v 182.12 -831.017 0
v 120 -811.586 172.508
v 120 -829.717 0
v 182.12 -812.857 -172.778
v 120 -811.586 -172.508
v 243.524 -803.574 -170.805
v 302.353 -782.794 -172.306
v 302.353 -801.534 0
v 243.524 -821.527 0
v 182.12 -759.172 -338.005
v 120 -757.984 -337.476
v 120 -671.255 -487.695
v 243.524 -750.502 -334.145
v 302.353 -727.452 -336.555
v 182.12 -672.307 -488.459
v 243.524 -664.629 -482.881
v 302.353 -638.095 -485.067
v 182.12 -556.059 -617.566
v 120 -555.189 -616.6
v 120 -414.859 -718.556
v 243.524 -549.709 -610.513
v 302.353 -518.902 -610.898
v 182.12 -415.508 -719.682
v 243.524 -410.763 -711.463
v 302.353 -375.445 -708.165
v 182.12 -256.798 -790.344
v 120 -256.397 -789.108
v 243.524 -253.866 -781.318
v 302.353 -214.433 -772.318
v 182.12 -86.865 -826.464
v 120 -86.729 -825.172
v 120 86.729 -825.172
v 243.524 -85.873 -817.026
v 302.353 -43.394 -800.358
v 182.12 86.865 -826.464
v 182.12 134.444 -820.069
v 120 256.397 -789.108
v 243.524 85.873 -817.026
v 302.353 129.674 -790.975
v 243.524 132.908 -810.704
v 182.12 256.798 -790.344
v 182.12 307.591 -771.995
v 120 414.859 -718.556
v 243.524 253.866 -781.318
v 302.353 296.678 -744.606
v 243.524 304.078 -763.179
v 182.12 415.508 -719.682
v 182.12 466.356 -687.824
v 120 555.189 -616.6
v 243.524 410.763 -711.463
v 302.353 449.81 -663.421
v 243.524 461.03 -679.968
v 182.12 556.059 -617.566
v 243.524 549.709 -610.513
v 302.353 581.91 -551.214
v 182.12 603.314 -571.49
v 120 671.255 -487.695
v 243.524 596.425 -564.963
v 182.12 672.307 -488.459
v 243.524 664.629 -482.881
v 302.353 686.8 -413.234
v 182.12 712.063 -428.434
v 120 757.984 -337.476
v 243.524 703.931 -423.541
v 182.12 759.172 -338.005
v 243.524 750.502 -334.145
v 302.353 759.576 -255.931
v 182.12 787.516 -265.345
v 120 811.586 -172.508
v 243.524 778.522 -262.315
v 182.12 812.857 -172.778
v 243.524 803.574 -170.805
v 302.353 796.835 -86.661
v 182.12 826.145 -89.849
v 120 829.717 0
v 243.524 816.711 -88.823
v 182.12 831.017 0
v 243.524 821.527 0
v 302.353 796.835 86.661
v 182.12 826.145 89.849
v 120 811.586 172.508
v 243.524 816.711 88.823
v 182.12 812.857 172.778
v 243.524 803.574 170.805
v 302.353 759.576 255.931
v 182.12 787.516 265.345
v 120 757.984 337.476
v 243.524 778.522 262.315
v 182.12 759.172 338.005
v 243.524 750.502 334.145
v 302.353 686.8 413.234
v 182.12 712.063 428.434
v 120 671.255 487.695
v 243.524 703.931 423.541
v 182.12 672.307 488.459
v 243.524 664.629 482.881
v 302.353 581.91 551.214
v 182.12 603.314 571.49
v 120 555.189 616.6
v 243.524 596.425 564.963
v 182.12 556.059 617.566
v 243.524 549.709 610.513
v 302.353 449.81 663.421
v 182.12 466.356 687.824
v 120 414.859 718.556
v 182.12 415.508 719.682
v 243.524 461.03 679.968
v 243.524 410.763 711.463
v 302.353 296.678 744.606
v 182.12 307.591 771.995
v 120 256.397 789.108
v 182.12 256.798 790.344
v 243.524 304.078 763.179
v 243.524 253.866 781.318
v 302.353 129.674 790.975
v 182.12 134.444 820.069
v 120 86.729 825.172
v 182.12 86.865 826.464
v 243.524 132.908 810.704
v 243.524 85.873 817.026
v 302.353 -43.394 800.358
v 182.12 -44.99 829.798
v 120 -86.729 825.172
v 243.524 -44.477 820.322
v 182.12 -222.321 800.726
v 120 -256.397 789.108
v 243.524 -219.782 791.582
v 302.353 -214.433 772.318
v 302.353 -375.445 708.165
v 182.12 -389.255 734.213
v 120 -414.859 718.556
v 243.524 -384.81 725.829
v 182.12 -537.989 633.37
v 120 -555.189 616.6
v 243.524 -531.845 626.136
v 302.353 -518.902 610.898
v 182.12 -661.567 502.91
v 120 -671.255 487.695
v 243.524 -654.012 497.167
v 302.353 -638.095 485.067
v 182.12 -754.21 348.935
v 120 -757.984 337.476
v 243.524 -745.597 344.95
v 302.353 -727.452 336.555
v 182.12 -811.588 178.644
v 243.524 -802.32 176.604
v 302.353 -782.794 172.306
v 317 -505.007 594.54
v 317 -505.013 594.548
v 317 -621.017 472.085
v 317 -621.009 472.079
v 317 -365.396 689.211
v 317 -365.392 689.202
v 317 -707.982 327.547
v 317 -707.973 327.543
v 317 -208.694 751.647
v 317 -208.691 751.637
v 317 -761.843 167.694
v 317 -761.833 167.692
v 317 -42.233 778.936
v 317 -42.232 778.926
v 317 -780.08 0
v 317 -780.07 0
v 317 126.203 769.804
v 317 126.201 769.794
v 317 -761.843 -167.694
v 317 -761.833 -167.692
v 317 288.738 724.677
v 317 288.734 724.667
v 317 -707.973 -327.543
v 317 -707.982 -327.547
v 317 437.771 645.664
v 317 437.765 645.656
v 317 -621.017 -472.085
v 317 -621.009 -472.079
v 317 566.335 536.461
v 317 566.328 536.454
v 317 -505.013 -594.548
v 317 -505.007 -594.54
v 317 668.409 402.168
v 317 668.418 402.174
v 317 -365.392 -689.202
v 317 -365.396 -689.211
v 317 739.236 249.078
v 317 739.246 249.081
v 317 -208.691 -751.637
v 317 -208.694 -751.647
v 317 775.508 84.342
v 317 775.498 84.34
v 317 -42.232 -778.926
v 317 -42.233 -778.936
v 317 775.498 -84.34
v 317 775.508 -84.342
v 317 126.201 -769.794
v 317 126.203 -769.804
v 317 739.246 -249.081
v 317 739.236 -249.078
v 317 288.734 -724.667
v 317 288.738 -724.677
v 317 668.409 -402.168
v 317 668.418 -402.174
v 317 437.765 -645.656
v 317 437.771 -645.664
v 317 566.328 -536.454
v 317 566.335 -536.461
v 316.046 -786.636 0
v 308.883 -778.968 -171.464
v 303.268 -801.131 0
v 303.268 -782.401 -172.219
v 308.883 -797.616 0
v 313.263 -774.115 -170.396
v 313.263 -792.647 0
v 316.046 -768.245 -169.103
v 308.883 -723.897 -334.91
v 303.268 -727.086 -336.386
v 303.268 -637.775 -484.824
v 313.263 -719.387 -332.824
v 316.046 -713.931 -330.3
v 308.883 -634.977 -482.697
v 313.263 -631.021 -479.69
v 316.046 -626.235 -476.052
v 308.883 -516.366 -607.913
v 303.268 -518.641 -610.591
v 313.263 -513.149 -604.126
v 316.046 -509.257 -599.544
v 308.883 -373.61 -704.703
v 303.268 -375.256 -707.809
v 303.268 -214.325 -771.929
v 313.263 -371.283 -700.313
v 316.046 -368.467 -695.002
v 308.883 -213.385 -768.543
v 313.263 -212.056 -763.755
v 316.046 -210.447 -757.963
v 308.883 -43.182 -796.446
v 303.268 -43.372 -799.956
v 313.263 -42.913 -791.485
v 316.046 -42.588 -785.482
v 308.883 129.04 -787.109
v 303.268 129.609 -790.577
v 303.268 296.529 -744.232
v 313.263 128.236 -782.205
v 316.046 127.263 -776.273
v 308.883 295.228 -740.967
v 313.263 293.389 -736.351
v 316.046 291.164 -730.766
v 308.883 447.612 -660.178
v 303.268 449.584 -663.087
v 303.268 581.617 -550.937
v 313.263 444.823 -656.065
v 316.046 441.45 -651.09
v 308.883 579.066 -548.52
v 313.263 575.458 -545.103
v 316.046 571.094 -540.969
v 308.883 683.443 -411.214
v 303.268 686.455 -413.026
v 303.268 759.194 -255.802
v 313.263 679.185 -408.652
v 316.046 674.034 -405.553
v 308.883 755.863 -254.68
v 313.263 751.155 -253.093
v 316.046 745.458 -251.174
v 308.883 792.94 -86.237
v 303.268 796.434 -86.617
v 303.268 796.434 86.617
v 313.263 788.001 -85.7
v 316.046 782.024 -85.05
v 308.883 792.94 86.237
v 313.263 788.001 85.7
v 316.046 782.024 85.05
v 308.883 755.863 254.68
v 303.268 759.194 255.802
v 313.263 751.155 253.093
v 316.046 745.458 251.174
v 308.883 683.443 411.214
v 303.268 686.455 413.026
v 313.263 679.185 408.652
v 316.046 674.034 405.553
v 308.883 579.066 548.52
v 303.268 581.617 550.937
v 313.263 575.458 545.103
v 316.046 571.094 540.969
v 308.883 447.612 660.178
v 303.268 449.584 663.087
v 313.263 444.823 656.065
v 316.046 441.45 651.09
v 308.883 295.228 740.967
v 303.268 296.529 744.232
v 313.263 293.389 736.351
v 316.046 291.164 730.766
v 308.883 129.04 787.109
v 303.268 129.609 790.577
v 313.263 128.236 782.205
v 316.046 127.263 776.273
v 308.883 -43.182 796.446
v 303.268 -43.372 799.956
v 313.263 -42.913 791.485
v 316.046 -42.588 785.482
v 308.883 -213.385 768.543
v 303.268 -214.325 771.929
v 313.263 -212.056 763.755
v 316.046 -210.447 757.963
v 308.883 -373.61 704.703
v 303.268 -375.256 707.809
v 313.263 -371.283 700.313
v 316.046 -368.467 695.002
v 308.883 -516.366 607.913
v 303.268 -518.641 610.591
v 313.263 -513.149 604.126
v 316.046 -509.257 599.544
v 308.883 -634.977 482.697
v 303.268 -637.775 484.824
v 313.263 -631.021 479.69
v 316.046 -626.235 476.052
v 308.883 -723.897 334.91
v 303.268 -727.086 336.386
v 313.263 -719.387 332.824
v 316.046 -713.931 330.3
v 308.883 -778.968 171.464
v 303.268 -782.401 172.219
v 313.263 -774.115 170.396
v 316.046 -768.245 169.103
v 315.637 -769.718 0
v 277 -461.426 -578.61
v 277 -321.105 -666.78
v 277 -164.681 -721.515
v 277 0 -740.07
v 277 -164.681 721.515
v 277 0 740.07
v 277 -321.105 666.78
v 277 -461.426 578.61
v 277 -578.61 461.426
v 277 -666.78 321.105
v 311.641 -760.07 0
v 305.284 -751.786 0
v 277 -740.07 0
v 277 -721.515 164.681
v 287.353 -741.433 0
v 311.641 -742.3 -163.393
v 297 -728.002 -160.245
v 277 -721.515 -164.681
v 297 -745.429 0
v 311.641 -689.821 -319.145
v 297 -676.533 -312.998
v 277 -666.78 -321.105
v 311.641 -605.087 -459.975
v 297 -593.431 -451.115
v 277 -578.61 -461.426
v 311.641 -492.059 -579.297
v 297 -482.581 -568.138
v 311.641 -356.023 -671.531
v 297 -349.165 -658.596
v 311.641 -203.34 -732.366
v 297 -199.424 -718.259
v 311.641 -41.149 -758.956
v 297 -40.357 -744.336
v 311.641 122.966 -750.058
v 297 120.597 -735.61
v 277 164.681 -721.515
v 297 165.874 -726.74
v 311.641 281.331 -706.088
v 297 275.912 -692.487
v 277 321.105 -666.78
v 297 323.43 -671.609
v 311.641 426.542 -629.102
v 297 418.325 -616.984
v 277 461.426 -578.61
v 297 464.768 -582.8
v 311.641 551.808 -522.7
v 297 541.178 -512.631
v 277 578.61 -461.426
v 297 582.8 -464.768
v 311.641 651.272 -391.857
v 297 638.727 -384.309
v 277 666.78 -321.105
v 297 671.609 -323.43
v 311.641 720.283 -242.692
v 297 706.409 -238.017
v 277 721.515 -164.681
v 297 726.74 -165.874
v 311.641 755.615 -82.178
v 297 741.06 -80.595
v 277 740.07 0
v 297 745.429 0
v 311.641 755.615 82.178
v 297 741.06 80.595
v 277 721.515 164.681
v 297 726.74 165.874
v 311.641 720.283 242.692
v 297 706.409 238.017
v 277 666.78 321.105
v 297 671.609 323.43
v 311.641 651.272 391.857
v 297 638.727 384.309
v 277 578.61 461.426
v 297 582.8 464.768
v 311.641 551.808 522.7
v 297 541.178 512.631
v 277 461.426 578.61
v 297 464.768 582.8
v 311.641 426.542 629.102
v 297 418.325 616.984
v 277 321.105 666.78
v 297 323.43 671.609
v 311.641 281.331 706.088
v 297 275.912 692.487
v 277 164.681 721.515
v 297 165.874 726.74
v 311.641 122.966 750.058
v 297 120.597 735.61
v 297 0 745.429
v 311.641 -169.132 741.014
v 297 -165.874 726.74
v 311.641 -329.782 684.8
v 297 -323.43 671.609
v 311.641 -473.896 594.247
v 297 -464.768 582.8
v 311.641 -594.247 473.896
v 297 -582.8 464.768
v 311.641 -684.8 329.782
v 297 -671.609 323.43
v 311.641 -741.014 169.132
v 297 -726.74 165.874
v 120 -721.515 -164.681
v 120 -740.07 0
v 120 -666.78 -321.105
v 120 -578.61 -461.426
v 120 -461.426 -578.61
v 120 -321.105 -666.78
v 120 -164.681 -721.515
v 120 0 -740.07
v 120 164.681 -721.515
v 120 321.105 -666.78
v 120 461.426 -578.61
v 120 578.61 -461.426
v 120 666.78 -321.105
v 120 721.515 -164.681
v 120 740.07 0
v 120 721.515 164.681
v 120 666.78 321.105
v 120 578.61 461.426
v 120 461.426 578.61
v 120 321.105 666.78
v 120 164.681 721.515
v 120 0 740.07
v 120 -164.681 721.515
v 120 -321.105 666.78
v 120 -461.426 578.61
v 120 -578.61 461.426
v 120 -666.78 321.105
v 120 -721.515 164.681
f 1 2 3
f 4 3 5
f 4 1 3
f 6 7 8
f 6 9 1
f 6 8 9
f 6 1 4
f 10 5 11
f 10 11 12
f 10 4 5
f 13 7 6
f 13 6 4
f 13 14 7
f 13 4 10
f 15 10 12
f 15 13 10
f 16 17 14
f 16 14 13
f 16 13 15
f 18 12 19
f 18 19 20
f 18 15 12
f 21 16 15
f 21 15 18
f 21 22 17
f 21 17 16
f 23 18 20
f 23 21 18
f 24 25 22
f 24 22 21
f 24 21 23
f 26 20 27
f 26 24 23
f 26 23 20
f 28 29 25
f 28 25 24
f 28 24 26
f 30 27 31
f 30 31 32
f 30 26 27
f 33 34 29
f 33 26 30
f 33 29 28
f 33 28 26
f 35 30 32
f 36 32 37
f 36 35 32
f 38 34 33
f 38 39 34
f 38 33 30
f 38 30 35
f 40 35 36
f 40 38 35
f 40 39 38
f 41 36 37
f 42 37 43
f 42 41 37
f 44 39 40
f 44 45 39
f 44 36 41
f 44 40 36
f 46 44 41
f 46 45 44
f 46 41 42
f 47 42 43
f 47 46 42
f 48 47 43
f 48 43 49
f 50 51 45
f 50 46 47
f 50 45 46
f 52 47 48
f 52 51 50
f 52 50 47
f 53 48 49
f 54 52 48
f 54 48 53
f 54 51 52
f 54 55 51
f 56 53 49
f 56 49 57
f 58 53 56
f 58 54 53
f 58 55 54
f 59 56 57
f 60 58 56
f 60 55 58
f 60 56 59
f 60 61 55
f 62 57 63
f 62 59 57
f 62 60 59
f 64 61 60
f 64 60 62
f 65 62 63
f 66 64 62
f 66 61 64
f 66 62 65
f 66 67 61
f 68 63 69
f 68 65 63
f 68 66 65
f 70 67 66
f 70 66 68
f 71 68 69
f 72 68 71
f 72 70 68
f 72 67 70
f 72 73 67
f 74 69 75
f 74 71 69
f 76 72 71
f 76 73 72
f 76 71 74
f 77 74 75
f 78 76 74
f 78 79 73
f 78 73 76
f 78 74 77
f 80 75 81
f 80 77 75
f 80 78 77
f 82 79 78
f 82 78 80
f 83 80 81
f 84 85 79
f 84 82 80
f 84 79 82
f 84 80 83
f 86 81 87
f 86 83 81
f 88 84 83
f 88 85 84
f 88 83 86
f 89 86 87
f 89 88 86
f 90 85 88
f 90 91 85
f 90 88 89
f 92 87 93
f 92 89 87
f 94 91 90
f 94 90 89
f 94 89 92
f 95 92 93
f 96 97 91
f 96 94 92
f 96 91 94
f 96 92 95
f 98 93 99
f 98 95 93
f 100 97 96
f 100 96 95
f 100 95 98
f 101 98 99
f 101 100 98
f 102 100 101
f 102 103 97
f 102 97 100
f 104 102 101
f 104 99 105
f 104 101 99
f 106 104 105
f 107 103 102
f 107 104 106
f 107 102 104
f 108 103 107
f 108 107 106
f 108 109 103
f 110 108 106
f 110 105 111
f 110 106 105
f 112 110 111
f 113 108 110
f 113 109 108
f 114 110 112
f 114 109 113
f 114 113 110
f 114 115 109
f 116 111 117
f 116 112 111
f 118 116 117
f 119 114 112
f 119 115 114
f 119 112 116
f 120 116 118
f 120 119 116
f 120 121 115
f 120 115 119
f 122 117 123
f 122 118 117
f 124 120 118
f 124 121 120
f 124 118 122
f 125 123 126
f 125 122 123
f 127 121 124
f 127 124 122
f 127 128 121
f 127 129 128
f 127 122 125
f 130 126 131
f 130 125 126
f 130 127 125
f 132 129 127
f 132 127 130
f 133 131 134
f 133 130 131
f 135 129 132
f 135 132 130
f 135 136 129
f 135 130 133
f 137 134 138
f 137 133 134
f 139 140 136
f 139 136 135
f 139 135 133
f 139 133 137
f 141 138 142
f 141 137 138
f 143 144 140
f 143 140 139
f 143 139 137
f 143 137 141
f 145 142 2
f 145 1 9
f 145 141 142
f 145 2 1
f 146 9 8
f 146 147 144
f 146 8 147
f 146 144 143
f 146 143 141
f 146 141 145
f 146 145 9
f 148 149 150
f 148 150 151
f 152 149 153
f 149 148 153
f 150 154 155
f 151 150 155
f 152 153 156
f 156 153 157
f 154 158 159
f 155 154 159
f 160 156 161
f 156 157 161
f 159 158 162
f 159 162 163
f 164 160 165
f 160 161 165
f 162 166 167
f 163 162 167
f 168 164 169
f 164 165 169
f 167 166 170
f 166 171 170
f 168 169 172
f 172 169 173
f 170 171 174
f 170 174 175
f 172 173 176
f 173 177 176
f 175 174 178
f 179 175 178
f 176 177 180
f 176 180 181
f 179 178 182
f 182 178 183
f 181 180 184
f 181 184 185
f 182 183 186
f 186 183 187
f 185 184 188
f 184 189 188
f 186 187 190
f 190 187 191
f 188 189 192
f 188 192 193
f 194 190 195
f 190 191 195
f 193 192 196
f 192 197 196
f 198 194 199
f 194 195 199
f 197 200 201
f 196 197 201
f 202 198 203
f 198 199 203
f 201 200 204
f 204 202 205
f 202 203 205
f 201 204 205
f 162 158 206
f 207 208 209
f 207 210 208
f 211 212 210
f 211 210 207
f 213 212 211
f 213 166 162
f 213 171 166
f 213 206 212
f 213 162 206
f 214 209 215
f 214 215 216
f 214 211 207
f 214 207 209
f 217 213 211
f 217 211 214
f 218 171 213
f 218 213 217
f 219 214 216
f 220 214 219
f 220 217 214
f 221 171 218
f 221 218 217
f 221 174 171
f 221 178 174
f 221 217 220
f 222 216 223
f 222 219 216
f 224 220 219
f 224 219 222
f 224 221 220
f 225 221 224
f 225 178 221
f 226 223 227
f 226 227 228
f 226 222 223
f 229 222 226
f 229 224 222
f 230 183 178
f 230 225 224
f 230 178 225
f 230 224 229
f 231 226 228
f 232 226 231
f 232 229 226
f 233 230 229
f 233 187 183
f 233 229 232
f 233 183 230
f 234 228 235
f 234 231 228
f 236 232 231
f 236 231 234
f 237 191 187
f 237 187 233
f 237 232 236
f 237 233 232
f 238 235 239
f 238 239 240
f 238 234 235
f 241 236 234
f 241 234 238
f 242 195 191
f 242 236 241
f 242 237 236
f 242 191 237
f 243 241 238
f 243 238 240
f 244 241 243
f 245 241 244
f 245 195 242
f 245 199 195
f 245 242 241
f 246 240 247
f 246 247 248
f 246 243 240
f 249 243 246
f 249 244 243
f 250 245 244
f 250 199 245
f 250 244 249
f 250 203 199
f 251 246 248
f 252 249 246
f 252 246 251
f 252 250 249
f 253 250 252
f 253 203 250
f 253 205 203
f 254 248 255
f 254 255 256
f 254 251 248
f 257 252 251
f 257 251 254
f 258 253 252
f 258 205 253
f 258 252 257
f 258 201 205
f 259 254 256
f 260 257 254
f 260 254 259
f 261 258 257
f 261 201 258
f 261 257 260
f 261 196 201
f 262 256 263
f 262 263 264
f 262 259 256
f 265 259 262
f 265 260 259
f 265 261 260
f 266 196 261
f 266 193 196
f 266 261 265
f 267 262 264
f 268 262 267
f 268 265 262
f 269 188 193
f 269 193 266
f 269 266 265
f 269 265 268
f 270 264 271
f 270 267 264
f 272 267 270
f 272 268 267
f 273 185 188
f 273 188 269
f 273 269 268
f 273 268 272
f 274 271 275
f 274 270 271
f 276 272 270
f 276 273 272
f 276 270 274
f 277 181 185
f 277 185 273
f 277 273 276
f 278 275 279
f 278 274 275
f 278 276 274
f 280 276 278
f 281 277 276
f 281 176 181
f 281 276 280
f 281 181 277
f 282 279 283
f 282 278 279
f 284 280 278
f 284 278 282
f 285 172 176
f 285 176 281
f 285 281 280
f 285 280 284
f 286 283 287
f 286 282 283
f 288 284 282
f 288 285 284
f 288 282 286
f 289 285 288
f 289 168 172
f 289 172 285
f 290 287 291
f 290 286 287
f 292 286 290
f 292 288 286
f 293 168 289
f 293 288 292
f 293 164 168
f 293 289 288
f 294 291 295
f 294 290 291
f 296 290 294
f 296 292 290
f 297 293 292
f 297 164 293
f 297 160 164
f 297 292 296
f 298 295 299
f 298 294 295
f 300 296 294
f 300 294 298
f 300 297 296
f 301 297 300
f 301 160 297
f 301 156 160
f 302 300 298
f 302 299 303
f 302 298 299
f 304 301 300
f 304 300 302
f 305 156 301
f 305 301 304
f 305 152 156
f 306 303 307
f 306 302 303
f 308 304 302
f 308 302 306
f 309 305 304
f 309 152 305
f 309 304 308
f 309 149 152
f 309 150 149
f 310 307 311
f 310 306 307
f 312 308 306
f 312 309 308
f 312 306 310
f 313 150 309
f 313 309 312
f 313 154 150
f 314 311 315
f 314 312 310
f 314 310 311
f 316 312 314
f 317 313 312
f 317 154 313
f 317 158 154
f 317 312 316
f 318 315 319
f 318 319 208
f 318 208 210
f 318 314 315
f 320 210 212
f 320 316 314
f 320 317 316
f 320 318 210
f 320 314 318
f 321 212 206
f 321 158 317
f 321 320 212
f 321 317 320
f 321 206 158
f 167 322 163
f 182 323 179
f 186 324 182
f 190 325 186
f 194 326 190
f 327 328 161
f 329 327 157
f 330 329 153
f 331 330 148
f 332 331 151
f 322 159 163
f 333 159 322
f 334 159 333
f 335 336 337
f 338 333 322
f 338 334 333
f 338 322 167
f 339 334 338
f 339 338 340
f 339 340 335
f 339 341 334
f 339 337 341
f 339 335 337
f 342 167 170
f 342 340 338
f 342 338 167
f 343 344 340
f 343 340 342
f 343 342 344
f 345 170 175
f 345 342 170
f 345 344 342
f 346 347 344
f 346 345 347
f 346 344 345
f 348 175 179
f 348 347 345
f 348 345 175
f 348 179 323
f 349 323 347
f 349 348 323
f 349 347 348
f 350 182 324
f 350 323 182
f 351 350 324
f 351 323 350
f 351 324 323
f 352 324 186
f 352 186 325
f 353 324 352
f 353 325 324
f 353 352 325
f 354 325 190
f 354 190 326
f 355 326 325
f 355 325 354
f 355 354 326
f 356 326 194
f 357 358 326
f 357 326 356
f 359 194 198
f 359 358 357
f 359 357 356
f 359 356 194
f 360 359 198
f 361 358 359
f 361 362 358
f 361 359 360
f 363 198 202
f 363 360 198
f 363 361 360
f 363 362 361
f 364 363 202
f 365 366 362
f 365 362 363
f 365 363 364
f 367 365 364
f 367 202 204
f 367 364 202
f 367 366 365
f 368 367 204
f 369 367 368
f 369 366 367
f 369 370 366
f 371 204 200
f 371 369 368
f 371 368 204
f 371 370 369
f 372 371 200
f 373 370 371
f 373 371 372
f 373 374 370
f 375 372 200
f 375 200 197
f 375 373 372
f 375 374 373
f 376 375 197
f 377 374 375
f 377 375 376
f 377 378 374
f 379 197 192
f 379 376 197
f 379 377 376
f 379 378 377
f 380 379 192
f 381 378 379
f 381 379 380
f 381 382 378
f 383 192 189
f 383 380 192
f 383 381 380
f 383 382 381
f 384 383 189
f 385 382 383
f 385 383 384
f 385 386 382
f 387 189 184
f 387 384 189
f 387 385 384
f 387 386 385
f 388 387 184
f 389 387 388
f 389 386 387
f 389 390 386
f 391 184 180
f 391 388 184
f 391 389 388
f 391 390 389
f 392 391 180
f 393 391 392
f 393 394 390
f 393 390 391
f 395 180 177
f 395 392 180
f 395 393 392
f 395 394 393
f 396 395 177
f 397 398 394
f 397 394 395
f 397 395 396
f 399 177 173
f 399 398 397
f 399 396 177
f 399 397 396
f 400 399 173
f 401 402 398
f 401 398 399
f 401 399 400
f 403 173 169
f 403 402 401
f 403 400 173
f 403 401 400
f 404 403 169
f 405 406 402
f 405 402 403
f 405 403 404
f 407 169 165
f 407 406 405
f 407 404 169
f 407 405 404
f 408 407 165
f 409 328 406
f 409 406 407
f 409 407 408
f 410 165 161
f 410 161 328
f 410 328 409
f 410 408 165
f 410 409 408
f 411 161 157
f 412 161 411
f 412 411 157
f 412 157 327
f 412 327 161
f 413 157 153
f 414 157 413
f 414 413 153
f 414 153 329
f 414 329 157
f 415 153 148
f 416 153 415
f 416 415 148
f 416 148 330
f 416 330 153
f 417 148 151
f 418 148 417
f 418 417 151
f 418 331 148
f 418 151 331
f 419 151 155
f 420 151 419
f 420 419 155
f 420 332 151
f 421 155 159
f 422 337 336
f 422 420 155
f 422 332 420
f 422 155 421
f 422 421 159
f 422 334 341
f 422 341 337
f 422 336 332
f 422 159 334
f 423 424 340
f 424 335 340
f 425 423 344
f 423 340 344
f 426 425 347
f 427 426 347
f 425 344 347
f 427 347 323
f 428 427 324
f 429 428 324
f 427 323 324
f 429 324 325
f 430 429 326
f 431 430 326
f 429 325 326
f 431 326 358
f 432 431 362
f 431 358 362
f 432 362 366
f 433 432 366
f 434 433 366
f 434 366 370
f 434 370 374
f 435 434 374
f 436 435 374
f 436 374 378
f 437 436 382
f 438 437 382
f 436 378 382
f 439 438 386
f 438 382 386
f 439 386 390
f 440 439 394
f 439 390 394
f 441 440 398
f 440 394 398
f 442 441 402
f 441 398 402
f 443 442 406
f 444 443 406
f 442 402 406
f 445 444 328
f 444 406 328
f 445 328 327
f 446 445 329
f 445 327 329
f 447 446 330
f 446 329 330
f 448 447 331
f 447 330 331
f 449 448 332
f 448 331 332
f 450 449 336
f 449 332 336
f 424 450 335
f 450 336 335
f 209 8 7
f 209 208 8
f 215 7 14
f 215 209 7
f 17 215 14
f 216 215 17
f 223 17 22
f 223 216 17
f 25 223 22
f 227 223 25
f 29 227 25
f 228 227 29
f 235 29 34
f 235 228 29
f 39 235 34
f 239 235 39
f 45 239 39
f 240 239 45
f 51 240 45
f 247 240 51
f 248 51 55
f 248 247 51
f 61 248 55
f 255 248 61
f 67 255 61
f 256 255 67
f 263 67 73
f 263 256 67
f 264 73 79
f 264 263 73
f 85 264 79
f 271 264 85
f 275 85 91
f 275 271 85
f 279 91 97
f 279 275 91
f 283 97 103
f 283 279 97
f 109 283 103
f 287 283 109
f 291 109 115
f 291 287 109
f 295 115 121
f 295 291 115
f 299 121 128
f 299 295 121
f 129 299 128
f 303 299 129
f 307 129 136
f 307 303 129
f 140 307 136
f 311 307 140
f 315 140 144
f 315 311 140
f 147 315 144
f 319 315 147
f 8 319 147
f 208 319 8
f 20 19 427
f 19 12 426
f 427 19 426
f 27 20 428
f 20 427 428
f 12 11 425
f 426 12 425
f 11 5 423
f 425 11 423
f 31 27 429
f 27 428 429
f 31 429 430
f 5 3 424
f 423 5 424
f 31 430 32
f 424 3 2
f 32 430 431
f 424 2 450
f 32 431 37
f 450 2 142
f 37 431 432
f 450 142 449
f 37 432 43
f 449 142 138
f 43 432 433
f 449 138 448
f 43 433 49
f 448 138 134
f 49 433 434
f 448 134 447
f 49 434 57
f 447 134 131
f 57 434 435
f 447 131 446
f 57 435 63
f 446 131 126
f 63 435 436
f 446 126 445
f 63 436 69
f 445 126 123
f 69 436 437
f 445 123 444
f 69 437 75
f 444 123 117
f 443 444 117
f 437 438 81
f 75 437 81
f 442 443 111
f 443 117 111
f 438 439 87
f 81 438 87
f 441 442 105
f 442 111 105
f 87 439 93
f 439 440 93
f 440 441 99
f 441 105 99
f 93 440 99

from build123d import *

# Parameters (mm, degrees)
SKETCH001_W = 2773.187988
SKETCH001_H = 2729.466553
PAD_DEPTH   = 120


with BuildPart() as pad:
    # Sketch001 → Pad (new body)
    with BuildSketch(Plane.YZ):
        with Locations((0.000122, 6.245971)):
            Rectangle(SKETCH001_W, SKETCH001_H)
    extrude(amount=PAD_DEPTH)


with BuildPart() as cut:
    # Sketch → Revolution (revolve)
    with BuildSketch(Plane.XY):
        with BuildLine():
            ThreePointArc((14.647409, -801.533556), (158.5, -831.799058), (302.352591, -801.533556))
            Line((302.352591, -801.533556), (303.267814, -801.130607))
            ThreePointArc((303.267814, -801.130607), (313.263433, -792.647113), (317, -780.080485))
            Line((317, -780.070485), (317, -780.080485))
            ThreePointArc((317, -780.070485), (305.284271, -751.786214), (277, -740.070485))
            Line((40, -740.070485), (277, -740.070485))
            ThreePointArc((40, -740.070485), (11.715729, -751.786214), (0, -780.070485))
            Line((0, -780.070485), (0, -780.080485))
            ThreePointArc((0, -780.080485), (3.736567, -792.647113), (13.732186, -801.130607))
            Line((13.732186, -801.130607), (14.647409, -801.533556))
        make_face()
    revolve(axis=Axis((0, 0, 0), (1, 0, 0)))

    # Cut: cut Pad
    add(pad.part, mode=Mode.SUBTRACT)


solid = cut.part
